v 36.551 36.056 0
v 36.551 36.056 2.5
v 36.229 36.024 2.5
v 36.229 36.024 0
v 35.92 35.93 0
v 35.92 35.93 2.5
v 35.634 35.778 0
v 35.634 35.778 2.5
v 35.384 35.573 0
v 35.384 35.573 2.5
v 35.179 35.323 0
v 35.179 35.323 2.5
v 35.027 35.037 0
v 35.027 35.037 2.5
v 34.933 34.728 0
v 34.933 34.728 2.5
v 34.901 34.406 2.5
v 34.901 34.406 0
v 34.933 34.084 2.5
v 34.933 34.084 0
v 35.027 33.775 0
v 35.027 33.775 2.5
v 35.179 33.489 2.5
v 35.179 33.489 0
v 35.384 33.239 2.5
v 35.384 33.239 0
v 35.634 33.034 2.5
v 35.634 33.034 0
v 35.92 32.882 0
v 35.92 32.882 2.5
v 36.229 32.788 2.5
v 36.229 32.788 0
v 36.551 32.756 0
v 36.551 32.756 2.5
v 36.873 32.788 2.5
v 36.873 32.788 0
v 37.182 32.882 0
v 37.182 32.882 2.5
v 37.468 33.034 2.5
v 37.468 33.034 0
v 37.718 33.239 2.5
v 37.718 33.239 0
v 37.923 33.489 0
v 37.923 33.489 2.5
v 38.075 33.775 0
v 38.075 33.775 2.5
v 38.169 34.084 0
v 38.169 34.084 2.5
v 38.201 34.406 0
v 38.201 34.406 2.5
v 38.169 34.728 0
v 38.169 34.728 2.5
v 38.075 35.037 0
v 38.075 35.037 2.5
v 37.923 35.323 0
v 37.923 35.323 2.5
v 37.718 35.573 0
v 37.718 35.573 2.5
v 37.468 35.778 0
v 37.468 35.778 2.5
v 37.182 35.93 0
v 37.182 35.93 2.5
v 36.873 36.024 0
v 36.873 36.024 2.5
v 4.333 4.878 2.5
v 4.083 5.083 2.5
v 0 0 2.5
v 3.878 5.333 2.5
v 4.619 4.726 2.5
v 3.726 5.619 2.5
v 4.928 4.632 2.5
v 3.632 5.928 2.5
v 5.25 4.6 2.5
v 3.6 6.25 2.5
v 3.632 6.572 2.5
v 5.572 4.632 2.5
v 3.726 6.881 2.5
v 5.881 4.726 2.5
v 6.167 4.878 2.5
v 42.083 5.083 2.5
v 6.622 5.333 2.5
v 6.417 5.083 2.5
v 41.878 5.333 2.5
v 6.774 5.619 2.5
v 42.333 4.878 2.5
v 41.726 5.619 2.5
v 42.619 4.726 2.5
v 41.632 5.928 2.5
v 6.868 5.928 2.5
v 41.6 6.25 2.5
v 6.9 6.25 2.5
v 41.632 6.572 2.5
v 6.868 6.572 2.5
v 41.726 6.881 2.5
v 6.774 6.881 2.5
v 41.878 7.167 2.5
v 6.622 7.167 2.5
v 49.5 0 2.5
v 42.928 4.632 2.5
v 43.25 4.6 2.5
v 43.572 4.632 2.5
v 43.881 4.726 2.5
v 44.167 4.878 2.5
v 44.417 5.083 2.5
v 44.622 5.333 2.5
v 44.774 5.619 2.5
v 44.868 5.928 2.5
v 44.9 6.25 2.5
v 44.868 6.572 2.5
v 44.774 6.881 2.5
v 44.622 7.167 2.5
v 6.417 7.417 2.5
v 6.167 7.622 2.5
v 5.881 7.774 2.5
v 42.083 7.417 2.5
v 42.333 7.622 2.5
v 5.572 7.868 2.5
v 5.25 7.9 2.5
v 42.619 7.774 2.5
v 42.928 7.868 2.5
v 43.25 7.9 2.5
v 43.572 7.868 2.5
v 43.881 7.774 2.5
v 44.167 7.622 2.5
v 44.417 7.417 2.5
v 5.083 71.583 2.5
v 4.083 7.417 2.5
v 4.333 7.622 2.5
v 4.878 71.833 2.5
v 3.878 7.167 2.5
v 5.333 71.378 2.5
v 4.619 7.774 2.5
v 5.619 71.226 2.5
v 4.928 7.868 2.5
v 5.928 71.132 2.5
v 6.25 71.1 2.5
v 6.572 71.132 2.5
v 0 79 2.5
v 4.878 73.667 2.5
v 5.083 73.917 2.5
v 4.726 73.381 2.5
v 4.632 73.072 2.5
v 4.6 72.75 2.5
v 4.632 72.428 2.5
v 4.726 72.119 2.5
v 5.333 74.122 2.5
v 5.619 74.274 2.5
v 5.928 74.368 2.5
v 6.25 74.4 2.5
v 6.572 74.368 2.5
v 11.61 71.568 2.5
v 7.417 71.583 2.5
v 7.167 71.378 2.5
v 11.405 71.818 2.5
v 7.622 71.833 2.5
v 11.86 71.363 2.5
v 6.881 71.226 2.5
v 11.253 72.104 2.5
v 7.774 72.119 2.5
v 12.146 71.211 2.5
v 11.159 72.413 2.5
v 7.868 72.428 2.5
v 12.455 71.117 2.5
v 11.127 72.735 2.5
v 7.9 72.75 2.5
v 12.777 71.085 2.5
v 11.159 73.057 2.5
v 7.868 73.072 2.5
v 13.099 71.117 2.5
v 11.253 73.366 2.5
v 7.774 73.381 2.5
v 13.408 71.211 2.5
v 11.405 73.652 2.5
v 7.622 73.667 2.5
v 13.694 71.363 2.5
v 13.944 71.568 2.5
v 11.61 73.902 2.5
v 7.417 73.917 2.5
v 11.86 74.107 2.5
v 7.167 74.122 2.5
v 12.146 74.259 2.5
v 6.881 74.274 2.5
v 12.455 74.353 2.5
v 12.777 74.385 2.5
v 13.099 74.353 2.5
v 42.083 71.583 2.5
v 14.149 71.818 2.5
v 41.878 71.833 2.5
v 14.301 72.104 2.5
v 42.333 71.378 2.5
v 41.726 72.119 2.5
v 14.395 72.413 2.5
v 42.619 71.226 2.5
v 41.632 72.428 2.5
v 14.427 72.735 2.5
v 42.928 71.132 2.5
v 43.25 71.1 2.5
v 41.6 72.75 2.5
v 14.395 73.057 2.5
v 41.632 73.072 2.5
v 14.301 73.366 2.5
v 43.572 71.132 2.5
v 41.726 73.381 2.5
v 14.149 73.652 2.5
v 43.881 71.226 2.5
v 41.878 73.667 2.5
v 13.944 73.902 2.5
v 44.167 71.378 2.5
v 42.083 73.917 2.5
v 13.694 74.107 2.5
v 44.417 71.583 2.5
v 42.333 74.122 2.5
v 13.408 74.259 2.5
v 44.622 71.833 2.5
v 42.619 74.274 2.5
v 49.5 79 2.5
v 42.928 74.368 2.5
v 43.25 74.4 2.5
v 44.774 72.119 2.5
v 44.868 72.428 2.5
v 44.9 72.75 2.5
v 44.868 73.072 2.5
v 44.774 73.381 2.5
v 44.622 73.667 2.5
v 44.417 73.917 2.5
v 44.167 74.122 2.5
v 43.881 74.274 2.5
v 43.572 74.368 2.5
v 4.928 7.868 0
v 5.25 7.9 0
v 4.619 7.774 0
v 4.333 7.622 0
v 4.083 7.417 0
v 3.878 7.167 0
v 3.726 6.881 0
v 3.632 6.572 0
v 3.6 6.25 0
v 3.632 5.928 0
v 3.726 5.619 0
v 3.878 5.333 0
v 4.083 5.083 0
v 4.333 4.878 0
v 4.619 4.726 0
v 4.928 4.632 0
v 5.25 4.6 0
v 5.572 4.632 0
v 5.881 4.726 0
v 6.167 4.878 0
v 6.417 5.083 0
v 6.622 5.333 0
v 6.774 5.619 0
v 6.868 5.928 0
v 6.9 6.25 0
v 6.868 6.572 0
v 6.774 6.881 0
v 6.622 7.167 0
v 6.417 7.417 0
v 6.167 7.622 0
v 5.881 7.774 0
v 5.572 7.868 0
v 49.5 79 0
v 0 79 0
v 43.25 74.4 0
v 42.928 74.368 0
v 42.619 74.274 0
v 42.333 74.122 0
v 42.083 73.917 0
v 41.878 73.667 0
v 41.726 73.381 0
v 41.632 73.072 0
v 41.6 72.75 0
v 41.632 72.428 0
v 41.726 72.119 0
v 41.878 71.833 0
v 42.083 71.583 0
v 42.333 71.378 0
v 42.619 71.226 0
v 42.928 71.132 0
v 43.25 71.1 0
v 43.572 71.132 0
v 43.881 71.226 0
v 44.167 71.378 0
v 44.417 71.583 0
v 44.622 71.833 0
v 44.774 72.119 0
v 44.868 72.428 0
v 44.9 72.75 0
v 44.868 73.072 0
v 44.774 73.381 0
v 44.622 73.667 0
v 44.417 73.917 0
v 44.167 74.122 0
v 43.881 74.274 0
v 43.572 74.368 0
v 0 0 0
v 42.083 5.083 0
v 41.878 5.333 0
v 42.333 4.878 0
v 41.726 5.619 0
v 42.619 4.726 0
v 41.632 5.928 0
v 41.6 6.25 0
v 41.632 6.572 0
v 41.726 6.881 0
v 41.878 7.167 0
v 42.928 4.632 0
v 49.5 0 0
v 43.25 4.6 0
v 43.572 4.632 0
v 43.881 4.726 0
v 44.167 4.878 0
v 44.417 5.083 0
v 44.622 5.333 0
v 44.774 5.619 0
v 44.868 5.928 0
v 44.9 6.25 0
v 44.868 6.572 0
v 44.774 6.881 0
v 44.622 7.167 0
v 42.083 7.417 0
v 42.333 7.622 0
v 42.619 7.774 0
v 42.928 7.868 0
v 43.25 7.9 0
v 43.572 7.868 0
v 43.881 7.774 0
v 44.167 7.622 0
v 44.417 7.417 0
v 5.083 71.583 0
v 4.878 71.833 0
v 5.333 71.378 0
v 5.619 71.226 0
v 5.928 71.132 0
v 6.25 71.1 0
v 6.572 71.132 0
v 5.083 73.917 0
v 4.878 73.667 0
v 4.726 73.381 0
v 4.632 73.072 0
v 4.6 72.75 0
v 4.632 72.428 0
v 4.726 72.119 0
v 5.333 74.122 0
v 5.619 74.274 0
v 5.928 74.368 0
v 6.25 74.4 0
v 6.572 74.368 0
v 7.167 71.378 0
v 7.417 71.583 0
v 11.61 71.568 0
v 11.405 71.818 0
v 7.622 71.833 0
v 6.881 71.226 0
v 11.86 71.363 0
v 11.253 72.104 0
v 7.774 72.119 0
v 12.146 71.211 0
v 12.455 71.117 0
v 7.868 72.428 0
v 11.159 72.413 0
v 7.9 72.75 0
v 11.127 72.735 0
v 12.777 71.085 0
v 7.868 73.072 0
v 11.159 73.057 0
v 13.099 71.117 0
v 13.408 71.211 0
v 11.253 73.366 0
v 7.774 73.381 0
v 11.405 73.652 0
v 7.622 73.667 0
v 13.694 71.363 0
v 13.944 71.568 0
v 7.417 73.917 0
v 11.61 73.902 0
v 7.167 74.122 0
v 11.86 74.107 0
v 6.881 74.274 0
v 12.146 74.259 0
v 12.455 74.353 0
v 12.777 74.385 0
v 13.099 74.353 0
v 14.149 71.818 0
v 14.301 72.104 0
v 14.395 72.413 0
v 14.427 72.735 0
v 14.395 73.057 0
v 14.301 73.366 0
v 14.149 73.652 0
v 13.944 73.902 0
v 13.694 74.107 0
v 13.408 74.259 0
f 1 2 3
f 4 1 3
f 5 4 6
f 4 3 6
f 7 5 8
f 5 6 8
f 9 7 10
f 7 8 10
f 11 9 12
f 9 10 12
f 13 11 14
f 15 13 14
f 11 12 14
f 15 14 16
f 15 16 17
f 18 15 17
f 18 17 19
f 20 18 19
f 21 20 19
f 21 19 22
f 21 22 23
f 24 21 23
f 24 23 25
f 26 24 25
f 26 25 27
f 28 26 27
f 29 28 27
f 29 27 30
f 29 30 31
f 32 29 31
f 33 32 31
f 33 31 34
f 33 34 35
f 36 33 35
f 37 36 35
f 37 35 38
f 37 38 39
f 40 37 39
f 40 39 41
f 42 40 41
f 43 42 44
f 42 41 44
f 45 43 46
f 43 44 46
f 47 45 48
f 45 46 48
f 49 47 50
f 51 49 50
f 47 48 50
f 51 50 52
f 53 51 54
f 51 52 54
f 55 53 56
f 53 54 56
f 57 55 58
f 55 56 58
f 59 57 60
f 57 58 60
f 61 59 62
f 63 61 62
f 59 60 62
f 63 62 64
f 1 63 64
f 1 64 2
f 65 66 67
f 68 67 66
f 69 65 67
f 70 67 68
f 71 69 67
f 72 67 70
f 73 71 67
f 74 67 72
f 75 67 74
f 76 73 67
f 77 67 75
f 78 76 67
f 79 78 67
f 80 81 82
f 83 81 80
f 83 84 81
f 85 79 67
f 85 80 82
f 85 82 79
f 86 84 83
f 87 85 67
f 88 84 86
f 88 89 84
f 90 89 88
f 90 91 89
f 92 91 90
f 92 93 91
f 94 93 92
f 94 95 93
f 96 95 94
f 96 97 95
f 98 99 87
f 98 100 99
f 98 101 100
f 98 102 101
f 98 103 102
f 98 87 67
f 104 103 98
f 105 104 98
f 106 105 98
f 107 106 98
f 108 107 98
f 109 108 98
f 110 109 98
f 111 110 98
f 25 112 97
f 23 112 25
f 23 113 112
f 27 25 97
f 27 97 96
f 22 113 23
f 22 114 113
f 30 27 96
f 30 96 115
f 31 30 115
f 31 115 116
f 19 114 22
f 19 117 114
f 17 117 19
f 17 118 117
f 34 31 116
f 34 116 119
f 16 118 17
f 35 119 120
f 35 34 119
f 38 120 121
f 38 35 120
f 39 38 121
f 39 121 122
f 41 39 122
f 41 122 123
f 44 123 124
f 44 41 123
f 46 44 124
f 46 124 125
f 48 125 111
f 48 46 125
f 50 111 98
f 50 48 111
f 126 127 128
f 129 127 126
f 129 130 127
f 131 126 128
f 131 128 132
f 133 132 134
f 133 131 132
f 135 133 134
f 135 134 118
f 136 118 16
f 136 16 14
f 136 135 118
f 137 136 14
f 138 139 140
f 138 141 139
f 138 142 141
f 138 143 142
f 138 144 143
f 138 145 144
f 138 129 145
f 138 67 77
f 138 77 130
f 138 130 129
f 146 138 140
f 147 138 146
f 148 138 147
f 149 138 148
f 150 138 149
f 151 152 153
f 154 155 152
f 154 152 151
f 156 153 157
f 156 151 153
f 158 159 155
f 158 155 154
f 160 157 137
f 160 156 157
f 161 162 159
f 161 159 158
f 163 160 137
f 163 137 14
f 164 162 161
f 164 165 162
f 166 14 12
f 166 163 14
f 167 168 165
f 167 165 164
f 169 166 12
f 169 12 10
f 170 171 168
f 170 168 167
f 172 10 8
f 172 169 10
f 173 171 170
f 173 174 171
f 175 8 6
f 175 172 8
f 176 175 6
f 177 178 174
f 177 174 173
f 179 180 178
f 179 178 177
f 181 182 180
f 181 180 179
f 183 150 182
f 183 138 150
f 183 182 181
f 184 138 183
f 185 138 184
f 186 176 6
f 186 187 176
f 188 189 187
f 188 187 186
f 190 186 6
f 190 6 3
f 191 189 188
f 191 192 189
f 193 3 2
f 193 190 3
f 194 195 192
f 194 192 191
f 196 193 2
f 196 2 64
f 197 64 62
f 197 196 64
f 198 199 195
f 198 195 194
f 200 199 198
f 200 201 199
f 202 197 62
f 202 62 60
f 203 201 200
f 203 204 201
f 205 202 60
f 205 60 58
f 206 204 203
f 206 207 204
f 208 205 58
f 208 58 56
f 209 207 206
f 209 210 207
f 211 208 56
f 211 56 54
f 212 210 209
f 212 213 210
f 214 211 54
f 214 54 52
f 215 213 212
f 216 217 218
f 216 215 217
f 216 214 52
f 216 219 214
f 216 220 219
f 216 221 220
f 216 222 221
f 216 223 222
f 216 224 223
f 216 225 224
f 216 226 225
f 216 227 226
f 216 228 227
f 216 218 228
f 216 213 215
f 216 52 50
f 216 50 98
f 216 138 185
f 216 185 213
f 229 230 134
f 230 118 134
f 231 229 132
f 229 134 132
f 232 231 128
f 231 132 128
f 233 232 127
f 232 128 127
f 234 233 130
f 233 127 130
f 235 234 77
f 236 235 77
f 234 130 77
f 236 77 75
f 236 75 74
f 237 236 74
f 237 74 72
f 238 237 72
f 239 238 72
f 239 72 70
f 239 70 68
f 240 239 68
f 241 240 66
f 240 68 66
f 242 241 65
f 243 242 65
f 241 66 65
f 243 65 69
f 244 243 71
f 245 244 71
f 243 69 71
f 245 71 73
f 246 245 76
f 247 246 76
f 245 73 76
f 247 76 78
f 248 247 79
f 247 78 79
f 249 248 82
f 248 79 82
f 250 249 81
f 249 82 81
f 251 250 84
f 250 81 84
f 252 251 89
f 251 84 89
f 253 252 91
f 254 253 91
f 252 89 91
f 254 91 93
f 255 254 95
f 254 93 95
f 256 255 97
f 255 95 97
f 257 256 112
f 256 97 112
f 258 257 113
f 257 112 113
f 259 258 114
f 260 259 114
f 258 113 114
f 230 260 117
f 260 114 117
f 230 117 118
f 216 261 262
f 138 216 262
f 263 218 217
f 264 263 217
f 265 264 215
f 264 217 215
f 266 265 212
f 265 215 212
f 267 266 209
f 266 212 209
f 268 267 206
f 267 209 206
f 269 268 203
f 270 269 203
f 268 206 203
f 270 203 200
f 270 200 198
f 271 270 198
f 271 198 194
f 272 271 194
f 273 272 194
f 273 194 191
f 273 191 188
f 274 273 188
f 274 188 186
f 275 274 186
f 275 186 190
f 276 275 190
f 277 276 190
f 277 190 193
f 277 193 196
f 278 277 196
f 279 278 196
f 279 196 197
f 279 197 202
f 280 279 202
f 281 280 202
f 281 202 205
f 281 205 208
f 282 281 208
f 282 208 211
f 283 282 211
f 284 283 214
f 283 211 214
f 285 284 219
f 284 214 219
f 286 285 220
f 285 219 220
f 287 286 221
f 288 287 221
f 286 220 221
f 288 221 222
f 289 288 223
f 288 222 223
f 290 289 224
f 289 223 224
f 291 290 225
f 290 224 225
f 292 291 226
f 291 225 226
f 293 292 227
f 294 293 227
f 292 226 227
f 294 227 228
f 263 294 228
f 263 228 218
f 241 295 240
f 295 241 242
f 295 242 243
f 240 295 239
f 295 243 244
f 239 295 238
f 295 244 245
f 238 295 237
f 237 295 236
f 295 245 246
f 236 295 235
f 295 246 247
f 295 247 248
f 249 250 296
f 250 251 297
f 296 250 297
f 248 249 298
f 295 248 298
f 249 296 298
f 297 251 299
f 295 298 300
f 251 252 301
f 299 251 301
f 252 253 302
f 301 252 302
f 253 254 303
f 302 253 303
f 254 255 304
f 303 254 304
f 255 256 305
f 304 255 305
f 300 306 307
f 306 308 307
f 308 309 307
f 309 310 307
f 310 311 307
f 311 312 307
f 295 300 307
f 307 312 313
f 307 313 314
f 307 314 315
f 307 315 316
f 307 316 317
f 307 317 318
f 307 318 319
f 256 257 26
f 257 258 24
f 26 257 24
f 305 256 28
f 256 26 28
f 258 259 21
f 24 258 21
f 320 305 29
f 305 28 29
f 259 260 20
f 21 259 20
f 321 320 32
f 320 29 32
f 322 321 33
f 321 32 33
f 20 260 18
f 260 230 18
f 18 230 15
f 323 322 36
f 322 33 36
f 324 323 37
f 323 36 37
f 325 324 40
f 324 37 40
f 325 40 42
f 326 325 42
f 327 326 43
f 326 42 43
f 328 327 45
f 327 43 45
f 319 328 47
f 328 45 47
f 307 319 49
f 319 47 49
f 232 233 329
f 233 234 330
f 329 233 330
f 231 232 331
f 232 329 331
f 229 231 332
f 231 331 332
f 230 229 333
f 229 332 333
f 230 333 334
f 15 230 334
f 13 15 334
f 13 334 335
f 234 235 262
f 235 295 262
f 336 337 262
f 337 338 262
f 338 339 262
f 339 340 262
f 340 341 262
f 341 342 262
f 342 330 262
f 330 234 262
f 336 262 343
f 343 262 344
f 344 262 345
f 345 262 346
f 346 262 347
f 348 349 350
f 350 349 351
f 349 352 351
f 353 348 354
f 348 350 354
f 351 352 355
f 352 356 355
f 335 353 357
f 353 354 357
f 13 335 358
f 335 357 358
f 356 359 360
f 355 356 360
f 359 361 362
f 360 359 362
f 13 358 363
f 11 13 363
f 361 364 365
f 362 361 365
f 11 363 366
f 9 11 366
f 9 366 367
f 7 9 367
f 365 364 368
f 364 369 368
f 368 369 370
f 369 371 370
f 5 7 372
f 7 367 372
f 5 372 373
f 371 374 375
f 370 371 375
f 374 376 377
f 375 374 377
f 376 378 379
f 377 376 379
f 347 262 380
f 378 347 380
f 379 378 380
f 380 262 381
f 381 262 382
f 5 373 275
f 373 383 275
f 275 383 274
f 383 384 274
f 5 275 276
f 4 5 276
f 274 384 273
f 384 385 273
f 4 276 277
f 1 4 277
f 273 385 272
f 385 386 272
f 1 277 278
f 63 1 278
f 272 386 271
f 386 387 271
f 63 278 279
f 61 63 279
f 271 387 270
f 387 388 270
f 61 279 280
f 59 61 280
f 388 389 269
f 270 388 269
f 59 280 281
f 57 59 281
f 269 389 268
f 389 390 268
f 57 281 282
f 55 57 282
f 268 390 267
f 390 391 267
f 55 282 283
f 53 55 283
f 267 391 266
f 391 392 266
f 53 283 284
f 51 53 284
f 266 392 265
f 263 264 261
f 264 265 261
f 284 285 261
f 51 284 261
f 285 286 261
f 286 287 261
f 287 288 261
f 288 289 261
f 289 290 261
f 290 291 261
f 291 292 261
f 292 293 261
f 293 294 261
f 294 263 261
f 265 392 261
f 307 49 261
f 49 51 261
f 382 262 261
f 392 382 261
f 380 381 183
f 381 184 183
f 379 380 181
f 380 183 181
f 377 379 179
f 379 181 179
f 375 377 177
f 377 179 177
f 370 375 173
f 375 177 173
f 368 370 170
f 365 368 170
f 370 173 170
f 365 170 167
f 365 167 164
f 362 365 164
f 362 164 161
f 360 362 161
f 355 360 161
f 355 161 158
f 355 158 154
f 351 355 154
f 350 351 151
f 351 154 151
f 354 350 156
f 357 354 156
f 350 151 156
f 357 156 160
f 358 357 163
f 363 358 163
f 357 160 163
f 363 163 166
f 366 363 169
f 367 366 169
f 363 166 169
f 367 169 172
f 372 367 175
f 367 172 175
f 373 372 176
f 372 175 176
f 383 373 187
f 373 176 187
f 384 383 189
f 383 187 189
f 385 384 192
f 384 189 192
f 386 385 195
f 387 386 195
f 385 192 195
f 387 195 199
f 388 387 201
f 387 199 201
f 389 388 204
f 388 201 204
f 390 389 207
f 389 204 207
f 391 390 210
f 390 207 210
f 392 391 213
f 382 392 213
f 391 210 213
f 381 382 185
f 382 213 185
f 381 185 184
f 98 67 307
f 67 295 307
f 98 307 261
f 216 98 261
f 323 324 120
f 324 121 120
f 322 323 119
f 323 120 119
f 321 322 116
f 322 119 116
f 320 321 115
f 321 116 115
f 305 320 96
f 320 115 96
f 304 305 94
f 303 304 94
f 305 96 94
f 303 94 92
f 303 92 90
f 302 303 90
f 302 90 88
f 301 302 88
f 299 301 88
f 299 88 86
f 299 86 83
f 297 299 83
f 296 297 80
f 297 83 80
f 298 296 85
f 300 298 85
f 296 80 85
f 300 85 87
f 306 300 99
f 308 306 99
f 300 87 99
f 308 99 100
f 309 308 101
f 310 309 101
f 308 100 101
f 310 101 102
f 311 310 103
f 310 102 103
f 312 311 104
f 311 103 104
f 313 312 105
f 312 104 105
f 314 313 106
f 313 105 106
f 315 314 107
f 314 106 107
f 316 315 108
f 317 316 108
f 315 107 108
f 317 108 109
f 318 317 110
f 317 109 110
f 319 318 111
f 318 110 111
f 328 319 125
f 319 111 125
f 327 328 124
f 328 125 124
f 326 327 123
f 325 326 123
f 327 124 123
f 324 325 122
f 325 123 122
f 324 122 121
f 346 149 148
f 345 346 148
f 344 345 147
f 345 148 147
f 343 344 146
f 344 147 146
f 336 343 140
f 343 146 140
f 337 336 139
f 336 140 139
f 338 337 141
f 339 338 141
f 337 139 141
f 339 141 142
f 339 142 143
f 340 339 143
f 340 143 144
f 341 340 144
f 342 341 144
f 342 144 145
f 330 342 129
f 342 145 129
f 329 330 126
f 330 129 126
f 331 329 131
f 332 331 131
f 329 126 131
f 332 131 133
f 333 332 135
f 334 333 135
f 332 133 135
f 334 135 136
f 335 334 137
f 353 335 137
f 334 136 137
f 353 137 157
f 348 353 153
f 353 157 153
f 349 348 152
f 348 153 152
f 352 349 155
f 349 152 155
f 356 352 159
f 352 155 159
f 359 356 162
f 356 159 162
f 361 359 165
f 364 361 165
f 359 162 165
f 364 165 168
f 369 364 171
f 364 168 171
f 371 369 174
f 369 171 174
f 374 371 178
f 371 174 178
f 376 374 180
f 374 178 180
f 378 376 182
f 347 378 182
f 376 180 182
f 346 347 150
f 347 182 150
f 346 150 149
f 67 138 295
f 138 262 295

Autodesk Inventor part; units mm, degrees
ref_plane "YZ Plane" through (0, 0, 0) normal (1, 0, 0) x (0, 1, 0)
ref_plane "XZ Plane" through (0, 0, 0) normal (0, 1, 0) x (-1, 0, 0)
ref_plane "XY Plane" through (0, 0, 0) normal (0, 0, 1) x (1, 0, 0)
sketch "Sketch1" plane through (0, 0, 0) normal (0, 0, 1) x (1, 0, 0)
  line L0 (0, 0) -> (49.5, 0)
  line L1 (49.5, 0) -> (49.5, 79)
  line L2 (49.5, 79) -> (0, 79)
  line L3 (0, 79) -> (0, 0)
  dimension "d0" = 49.5
  dimension "d1" = 79
extrude "Extrusion1" add sketch "Sketch1" along normal blind 2.5
sketch "Sketch2" plane through (0, 0, 0) normal (0, 0, 1) x (1, 0, 0)
  line L0 (0, 79) -> (0, 0) projected
  line L1 (49.5, 79) -> (0, 79) projected
  point P0 (12.777, 72.735)
  point P1 (36.551, 34.406)
  dimension "d4" = 12.777
  dimension "d5" = 6.265
  dimension "d6" = 38.329
  dimension "d7" = 23.774
hole "Hole1" at (12.777, 72.735, 0) at (36.551, 34.406, 0) direction (0, 0, 1) diameter 3.3 end through all
sketch "Sketch3" plane through (0, 0, 0) normal (0, 0, 1) x (1, 0, 0)
  line L0 (0, 0) -> (49.5, 0) projected
  line L1 (0, 79) -> (0, 0) projected
  point P0 (5.25, 6.25)
  point P1 (43.25, 6.25)
  point P2 (43.25, 72.75)
  point P3 (6.25, 72.75)
  dimension "d15" = 6.25
  dimension "d16" = 5.25
  dimension "d17" = 38
  dimension "d18" = 72.75
  dimension "d26" = 6.25
hole "Hole2" at (5.25, 6.25, 0) at (43.25, 6.25, 0) at (43.25, 72.75, 0) at (6.25, 72.75, 0) direction (0, 0, 1) diameter 3.3 end through all
properties part number "Tapadera_carcasa"
